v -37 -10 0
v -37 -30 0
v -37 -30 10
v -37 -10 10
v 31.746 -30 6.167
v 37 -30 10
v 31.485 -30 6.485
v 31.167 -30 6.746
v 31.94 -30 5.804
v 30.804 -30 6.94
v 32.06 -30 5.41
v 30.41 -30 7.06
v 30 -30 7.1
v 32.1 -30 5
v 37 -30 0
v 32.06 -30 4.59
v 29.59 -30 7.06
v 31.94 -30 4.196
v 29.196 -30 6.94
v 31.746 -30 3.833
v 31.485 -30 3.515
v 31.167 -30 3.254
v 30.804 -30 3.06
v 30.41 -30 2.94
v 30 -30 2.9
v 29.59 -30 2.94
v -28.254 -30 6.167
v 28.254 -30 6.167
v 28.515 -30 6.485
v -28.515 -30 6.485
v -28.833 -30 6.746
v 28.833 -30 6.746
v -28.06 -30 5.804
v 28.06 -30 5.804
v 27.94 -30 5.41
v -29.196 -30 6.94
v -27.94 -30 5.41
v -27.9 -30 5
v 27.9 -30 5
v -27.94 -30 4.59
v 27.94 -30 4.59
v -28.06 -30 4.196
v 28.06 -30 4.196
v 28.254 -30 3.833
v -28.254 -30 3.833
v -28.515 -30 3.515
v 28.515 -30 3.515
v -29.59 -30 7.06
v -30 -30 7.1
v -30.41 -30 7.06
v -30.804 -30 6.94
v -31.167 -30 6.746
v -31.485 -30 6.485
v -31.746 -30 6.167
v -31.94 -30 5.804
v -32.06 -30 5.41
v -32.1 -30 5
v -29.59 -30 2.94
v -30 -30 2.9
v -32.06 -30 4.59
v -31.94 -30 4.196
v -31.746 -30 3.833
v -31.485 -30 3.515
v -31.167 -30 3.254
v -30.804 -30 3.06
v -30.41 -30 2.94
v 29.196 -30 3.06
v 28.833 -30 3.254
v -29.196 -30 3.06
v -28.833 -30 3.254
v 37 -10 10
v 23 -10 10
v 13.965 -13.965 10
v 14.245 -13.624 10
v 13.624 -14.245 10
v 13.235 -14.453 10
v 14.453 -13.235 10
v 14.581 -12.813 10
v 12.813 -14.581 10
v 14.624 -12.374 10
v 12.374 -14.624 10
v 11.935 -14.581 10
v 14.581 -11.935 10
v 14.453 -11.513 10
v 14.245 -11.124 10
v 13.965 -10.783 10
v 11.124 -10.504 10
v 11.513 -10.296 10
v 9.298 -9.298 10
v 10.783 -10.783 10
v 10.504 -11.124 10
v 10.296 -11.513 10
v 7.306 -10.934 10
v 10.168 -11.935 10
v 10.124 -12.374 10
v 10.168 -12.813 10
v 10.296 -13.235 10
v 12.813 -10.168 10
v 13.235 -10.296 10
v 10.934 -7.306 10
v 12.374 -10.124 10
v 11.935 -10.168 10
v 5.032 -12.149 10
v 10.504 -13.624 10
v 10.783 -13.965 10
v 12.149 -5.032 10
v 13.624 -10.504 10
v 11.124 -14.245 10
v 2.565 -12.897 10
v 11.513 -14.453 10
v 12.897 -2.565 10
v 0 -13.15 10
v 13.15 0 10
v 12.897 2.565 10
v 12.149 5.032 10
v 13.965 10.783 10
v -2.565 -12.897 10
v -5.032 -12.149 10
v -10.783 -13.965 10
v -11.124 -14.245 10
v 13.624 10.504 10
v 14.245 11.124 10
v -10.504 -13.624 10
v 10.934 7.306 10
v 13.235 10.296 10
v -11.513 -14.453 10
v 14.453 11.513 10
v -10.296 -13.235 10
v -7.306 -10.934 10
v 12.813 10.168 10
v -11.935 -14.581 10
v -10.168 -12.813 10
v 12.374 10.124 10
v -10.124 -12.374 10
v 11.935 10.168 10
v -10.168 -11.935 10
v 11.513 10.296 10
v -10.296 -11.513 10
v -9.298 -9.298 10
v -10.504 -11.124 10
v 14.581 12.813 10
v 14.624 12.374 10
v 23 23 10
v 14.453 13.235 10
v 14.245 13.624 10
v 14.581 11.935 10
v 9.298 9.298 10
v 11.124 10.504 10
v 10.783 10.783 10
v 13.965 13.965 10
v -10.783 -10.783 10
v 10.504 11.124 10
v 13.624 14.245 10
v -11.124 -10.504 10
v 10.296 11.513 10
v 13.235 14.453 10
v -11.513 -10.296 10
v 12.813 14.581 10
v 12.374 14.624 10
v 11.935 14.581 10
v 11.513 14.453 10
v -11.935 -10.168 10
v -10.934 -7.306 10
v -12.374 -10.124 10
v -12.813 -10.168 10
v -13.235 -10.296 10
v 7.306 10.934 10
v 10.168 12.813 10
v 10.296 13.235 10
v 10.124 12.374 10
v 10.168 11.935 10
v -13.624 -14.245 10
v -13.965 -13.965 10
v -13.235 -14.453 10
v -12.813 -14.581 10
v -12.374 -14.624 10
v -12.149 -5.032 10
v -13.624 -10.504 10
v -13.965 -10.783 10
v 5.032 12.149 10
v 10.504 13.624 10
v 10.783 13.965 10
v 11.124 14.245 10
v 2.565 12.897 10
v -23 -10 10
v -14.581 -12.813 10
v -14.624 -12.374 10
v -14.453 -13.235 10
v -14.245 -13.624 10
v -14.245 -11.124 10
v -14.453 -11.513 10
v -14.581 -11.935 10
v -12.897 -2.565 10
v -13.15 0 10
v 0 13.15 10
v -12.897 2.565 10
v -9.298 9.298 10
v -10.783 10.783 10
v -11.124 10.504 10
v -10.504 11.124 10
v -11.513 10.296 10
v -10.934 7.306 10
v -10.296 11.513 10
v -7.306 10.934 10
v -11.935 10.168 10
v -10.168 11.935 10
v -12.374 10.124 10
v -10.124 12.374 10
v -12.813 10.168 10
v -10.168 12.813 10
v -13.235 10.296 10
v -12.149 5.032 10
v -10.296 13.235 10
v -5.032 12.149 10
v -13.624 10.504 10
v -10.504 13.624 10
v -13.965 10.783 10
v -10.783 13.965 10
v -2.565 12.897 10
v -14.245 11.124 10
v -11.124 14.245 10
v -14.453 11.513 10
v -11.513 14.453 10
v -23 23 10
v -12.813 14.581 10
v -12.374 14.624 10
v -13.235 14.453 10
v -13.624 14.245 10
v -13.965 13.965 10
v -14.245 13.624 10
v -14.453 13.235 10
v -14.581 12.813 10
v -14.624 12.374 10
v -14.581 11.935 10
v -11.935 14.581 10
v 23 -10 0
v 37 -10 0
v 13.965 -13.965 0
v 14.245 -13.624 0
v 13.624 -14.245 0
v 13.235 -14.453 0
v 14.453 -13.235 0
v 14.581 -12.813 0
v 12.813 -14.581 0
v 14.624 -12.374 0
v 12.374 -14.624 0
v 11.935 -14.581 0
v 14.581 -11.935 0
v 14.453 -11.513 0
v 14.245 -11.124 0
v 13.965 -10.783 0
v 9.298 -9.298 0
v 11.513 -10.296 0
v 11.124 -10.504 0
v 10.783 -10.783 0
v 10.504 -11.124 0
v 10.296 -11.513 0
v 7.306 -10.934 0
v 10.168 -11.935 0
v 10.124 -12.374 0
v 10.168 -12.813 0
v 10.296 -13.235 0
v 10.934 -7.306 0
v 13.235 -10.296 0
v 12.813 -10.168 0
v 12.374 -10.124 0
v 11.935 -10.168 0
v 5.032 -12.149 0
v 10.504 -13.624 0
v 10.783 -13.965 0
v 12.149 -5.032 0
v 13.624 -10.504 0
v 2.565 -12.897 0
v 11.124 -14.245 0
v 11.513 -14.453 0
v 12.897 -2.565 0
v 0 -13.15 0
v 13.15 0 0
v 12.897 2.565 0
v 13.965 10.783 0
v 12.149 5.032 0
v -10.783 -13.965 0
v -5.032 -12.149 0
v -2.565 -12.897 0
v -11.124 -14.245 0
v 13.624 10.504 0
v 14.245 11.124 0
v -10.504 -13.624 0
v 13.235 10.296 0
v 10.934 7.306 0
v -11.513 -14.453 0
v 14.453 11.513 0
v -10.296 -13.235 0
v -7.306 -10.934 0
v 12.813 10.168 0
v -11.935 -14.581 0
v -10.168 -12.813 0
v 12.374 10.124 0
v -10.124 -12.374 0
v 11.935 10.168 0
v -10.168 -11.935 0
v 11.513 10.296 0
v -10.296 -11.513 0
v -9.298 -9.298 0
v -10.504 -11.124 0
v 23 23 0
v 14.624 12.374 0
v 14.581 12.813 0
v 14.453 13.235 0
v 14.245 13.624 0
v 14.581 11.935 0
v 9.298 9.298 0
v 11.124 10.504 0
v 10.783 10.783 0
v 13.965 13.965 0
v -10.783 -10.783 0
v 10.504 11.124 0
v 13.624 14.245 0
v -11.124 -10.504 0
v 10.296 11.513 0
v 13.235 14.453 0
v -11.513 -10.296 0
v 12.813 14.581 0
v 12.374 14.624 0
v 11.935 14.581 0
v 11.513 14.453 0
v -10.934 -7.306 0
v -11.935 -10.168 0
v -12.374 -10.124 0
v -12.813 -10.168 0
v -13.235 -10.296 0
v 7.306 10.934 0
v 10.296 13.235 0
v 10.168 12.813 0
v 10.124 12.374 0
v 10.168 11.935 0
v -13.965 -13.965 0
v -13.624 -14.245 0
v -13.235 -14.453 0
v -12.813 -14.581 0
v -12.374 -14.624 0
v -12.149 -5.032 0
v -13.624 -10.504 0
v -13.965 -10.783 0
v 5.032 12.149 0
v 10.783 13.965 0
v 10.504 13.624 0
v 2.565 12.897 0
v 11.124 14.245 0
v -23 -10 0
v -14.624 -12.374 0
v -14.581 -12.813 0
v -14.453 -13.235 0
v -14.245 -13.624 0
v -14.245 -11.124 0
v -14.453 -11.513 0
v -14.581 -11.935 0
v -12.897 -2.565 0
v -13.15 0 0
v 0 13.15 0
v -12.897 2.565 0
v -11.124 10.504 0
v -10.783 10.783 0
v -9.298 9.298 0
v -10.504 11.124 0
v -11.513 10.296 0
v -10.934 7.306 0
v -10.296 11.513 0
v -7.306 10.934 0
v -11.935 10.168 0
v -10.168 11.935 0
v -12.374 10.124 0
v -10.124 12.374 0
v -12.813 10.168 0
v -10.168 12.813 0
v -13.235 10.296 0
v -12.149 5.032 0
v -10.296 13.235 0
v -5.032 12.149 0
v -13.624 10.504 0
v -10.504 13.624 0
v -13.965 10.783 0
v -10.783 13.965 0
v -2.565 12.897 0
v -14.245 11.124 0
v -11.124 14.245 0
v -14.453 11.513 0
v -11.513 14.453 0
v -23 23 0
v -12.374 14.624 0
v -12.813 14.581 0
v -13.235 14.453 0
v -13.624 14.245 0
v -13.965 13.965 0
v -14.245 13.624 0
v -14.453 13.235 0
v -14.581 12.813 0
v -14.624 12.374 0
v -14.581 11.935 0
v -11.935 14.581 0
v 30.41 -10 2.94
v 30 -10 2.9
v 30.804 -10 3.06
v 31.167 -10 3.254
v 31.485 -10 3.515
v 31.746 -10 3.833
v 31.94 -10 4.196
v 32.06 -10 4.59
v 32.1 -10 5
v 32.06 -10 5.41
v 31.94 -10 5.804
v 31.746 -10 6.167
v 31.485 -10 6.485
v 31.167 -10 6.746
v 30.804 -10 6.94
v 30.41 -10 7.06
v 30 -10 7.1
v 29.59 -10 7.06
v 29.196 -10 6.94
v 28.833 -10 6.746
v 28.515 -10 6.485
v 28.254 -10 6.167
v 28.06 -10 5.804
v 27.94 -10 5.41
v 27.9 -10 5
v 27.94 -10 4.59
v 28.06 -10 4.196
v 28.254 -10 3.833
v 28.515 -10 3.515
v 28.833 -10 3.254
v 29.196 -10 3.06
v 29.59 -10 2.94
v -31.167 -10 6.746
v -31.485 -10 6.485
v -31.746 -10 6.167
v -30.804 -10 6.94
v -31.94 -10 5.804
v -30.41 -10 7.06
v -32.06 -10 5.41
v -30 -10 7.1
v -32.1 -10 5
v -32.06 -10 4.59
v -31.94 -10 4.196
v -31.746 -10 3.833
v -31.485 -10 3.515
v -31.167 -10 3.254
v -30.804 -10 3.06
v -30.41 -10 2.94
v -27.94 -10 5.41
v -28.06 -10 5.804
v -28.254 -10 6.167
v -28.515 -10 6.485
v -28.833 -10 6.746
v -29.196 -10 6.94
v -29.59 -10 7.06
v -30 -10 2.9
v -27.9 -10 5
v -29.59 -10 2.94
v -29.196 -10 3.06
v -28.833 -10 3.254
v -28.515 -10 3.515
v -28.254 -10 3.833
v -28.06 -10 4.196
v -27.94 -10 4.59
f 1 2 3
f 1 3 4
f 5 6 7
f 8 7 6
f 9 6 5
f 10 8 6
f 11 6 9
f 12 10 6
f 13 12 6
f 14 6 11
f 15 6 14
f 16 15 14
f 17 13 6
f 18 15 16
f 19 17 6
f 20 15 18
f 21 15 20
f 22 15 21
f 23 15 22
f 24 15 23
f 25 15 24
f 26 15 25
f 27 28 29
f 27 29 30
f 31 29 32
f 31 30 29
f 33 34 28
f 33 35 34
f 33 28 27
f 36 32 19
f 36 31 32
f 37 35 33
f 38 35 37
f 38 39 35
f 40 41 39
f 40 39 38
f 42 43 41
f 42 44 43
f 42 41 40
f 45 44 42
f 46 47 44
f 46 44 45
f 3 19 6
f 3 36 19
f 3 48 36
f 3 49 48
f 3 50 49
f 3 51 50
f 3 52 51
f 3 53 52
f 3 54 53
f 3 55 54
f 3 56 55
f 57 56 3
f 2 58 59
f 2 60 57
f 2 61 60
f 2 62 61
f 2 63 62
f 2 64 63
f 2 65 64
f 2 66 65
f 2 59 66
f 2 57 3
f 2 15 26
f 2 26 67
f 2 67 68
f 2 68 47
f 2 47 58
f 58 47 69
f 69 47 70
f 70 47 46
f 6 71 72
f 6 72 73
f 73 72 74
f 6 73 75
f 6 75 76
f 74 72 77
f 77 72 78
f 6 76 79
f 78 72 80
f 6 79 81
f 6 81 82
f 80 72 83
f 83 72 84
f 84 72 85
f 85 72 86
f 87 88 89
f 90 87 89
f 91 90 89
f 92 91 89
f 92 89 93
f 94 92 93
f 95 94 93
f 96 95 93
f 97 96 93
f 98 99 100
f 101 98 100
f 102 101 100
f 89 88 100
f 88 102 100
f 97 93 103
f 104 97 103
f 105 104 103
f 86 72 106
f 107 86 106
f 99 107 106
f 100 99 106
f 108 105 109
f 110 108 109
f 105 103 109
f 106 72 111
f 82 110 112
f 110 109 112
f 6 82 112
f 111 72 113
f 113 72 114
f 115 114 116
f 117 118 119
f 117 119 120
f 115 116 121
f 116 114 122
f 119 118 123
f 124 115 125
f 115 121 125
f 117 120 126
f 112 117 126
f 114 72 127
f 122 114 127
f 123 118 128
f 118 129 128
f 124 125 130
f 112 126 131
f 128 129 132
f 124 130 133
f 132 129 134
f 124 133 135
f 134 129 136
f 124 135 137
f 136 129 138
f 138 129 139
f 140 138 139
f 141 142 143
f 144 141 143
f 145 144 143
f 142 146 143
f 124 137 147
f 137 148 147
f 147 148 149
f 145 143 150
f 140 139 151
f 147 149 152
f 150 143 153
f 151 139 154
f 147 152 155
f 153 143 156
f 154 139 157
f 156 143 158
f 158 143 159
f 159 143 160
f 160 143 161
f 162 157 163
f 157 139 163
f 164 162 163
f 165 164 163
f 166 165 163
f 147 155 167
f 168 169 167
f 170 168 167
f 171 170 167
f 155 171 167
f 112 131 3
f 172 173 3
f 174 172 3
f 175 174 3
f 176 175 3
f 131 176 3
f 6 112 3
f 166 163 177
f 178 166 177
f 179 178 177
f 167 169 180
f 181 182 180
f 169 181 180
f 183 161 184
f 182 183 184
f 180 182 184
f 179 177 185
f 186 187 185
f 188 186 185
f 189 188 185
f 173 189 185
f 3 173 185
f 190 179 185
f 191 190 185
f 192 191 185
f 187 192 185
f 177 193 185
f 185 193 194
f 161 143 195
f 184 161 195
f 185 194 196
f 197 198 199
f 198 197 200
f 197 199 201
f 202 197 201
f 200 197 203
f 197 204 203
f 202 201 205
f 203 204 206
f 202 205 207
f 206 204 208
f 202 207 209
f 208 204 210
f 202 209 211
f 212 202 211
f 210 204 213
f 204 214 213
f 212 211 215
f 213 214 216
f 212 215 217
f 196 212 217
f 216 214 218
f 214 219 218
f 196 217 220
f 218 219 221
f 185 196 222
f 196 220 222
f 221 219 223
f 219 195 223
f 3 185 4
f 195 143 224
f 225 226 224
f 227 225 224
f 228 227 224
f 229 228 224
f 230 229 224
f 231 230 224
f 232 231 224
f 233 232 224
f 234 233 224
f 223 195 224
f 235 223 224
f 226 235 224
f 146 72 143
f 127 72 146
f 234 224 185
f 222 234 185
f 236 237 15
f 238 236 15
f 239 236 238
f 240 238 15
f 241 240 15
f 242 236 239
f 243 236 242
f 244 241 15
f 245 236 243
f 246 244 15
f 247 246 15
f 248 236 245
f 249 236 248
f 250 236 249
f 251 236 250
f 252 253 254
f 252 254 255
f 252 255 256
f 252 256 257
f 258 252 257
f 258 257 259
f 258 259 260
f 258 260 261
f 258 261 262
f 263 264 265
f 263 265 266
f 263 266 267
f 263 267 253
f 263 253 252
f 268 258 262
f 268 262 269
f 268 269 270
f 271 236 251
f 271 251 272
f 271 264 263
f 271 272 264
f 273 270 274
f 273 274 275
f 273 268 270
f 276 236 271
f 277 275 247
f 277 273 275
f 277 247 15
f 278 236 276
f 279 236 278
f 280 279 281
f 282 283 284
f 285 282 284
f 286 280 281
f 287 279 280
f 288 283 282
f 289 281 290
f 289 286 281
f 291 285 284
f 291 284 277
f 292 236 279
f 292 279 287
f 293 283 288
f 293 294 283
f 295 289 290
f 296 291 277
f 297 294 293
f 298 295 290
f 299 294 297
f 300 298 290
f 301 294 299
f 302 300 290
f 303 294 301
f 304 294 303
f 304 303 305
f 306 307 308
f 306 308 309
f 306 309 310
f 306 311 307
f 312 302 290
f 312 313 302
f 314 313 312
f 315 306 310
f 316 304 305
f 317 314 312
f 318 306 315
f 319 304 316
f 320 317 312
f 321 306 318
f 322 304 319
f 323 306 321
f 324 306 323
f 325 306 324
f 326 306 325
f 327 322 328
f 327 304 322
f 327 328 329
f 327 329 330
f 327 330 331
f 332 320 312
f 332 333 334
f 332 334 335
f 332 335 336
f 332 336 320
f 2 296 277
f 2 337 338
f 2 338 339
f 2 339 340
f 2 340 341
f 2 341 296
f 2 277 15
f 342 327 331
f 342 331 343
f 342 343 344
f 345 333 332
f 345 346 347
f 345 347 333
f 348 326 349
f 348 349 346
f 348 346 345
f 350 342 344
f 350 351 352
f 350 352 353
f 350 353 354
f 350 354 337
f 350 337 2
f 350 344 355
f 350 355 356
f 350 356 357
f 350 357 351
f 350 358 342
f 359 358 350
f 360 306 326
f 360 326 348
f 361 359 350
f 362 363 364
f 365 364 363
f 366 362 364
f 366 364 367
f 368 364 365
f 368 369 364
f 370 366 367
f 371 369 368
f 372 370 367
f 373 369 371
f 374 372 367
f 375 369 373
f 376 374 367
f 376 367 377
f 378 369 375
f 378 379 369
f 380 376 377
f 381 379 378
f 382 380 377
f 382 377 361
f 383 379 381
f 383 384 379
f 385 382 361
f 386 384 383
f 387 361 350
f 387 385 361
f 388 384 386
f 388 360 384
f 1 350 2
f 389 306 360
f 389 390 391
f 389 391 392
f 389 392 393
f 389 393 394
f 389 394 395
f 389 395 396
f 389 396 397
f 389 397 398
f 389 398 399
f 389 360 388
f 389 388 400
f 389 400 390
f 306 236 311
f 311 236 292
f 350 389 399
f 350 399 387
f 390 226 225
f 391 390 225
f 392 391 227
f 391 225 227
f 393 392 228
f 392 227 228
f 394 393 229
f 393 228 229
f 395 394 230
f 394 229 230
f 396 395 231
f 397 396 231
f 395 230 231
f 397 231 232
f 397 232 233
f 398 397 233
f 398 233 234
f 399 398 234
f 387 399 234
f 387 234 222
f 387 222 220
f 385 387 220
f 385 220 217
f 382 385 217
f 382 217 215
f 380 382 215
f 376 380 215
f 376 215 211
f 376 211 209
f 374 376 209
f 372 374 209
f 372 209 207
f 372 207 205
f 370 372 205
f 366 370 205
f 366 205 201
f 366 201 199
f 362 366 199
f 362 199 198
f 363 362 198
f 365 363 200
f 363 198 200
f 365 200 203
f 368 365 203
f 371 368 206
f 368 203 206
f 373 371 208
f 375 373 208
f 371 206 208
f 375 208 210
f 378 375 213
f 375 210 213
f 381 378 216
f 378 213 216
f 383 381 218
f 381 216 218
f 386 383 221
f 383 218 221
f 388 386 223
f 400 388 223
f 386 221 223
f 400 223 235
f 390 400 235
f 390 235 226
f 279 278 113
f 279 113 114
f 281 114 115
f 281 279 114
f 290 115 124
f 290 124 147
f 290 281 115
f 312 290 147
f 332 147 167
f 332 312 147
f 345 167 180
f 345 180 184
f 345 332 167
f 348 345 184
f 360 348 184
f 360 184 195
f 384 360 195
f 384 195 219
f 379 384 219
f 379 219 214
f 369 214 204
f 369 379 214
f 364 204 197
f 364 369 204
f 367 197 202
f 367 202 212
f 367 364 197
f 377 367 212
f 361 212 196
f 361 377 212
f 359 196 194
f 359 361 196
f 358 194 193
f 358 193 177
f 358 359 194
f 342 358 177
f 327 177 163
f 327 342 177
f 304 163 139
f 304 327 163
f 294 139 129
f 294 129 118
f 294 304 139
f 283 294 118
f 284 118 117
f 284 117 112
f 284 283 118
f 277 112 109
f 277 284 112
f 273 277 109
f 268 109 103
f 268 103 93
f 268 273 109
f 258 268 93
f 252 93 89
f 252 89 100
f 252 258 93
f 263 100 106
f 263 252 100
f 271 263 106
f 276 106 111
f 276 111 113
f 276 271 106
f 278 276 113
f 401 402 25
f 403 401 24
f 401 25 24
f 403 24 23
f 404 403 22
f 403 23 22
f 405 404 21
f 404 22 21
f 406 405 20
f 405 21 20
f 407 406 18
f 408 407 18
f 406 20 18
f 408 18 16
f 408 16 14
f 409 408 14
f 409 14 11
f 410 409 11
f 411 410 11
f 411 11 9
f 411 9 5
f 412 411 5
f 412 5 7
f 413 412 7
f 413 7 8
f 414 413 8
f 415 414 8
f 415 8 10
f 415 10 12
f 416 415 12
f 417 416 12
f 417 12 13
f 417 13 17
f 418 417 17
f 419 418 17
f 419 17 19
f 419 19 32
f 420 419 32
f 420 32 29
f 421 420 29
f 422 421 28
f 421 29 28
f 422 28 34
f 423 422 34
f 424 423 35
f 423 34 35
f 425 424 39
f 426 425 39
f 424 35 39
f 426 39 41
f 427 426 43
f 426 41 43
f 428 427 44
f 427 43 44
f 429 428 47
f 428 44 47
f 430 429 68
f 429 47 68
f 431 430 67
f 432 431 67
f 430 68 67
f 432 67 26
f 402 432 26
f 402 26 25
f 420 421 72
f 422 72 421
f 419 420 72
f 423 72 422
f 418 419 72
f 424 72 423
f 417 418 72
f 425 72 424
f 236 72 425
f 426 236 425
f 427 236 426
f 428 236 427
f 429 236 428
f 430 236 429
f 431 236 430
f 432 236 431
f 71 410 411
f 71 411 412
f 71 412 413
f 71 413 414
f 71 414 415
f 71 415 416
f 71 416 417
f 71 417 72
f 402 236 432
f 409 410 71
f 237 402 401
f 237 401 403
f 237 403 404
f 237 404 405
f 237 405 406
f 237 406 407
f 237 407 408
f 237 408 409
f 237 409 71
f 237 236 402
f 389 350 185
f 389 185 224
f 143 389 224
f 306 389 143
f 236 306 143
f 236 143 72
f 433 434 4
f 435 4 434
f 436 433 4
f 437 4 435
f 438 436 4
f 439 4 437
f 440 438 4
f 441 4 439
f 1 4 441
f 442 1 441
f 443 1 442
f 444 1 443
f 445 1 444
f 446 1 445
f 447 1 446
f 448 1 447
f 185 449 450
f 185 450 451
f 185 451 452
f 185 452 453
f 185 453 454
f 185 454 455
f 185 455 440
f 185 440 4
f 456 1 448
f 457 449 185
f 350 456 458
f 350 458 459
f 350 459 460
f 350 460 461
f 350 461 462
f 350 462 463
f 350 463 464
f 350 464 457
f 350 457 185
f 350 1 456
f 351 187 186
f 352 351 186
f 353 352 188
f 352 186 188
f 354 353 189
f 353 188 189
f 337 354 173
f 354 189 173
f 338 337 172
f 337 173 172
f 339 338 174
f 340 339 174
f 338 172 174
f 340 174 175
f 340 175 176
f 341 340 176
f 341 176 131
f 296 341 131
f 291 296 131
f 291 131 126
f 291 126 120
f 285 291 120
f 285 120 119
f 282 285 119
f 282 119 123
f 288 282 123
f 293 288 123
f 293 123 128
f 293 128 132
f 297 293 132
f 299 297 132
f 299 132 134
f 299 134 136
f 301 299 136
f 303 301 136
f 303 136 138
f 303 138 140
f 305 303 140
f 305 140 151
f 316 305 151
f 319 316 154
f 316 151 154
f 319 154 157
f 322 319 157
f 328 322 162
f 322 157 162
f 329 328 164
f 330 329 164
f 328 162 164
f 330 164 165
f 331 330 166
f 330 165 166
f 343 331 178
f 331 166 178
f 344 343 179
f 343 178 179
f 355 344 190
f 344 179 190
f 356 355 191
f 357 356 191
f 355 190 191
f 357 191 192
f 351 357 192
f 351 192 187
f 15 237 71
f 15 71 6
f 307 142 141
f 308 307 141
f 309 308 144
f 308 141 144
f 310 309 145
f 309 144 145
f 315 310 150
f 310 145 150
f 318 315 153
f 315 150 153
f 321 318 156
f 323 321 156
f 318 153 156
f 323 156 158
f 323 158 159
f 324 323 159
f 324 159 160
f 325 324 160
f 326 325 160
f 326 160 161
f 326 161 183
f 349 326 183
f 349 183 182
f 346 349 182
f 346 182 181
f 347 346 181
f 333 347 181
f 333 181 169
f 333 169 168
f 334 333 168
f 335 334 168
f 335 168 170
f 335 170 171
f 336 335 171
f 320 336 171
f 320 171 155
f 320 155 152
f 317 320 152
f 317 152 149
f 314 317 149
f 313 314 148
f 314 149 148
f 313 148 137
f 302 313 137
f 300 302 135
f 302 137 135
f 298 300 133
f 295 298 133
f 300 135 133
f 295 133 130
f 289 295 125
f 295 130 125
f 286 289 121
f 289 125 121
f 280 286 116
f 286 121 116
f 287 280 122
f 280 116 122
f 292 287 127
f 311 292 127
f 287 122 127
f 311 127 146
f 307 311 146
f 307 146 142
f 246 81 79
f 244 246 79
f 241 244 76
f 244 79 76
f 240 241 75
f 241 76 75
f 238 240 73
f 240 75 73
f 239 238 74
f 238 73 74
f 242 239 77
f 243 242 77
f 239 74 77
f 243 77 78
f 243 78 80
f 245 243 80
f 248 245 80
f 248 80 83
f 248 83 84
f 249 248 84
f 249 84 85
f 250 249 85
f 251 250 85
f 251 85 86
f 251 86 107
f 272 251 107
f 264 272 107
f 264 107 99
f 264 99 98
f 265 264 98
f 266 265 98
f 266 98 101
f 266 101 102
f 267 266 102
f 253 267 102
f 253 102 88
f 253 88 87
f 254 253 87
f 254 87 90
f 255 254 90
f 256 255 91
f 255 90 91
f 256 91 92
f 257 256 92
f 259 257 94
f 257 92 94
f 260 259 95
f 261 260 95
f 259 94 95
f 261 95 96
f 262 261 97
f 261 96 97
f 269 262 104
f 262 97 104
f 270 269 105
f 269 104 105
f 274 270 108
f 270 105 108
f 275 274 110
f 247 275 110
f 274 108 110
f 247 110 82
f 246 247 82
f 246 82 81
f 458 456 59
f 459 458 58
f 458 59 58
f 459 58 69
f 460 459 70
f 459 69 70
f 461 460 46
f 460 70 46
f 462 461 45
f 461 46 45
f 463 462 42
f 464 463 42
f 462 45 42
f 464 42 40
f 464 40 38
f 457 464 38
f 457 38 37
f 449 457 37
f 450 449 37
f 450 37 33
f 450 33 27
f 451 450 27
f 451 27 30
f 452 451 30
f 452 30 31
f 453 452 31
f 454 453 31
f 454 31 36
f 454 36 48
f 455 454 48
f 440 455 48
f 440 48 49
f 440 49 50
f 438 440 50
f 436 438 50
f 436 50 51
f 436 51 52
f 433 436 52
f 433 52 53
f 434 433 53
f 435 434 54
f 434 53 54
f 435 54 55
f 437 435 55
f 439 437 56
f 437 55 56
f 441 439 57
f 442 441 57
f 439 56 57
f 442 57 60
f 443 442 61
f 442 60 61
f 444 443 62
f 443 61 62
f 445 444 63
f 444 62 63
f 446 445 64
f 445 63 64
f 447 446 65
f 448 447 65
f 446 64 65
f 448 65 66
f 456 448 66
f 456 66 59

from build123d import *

# Parameters (mm, degrees)
ESQUISSE1_R             = 13.15
BOSS_EXTRU_1_DEPTH      = 10
ENL_V_MAT_EXTRU_2_REACH = 67.406
ESQUISSE5_R             = 2.1
SKETCH1_R               = 2.25
CUT_EXTRUDE1_DEPTH      = 49.672374095
CIRPATTERN1_COUNT       = 4


with BuildPart() as part:
    # Esquisse1 → Boss.-Extru.1 (new body)
    with BuildSketch(Plane.XY):
        Polygon((-23, 23), (23, 23), (23, -10), (37, -10), (37, -30), (-37, -30), (-37, -10), (-23, -10), align=None)
        Circle(ESQUISSE1_R, mode=Mode.SUBTRACT)
    extrude(amount=BOSS_EXTRU_1_DEPTH)

    # Esquisse5 → Enlèv. mat.-Extru.2 (cut, up to next)
    with BuildSketch(Plane.XZ.offset(30), mode=Mode.PRIVATE) as enl_v_mat_extru_2_sk1:
        with Locations(Location((-30, 5, 0), (0, 0, 270))):
            Circle(ESQUISSE5_R)
    enl_v_mat_extru_2_tool1 = extrude(enl_v_mat_extru_2_sk1.sketch, amount=-ENL_V_MAT_EXTRU_2_REACH, mode=Mode.PRIVATE) & part.part
    # Esquisse5 → Enlèv. mat.-Extru.2 (cut, up to next)
    with BuildSketch(Plane.XZ.offset(30), mode=Mode.PRIVATE) as enl_v_mat_extru_2_sk2:
        with Locations(Location((30, 5, 0), (0, 0, 270))):
            Circle(ESQUISSE5_R)
    enl_v_mat_extru_2_tool2 = extrude(enl_v_mat_extru_2_sk2.sketch, amount=-ENL_V_MAT_EXTRU_2_REACH, mode=Mode.PRIVATE) & part.part
    add(enl_v_mat_extru_2_tool1.solids().sort_by_distance((-30, -30, 5))[0], mode=Mode.SUBTRACT)
    add(enl_v_mat_extru_2_tool2.solids().sort_by_distance((30, -30, 5))[0], mode=Mode.SUBTRACT)

    # Sketch1 → Cut-Extrude1 (cut, through all)
    with BuildSketch(Plane.XY.offset(10)):
        with Locations((12.374368671, 12.374368671)):
            Circle(SKETCH1_R)
    cut_extrude1 = extrude(amount=-CUT_EXTRUDE1_DEPTH, mode=Mode.SUBTRACT)

    # CirPattern1: Cut-Extrude1 ×4 about axis
    cirpattern1_axis = Axis((0, 0, 0), (0, 0, 1))
    for i in range(1, CIRPATTERN1_COUNT):
        add(cut_extrude1.rotate(cirpattern1_axis, i * 360 / CIRPATTERN1_COUNT), mode=Mode.SUBTRACT)


solid = part.part
